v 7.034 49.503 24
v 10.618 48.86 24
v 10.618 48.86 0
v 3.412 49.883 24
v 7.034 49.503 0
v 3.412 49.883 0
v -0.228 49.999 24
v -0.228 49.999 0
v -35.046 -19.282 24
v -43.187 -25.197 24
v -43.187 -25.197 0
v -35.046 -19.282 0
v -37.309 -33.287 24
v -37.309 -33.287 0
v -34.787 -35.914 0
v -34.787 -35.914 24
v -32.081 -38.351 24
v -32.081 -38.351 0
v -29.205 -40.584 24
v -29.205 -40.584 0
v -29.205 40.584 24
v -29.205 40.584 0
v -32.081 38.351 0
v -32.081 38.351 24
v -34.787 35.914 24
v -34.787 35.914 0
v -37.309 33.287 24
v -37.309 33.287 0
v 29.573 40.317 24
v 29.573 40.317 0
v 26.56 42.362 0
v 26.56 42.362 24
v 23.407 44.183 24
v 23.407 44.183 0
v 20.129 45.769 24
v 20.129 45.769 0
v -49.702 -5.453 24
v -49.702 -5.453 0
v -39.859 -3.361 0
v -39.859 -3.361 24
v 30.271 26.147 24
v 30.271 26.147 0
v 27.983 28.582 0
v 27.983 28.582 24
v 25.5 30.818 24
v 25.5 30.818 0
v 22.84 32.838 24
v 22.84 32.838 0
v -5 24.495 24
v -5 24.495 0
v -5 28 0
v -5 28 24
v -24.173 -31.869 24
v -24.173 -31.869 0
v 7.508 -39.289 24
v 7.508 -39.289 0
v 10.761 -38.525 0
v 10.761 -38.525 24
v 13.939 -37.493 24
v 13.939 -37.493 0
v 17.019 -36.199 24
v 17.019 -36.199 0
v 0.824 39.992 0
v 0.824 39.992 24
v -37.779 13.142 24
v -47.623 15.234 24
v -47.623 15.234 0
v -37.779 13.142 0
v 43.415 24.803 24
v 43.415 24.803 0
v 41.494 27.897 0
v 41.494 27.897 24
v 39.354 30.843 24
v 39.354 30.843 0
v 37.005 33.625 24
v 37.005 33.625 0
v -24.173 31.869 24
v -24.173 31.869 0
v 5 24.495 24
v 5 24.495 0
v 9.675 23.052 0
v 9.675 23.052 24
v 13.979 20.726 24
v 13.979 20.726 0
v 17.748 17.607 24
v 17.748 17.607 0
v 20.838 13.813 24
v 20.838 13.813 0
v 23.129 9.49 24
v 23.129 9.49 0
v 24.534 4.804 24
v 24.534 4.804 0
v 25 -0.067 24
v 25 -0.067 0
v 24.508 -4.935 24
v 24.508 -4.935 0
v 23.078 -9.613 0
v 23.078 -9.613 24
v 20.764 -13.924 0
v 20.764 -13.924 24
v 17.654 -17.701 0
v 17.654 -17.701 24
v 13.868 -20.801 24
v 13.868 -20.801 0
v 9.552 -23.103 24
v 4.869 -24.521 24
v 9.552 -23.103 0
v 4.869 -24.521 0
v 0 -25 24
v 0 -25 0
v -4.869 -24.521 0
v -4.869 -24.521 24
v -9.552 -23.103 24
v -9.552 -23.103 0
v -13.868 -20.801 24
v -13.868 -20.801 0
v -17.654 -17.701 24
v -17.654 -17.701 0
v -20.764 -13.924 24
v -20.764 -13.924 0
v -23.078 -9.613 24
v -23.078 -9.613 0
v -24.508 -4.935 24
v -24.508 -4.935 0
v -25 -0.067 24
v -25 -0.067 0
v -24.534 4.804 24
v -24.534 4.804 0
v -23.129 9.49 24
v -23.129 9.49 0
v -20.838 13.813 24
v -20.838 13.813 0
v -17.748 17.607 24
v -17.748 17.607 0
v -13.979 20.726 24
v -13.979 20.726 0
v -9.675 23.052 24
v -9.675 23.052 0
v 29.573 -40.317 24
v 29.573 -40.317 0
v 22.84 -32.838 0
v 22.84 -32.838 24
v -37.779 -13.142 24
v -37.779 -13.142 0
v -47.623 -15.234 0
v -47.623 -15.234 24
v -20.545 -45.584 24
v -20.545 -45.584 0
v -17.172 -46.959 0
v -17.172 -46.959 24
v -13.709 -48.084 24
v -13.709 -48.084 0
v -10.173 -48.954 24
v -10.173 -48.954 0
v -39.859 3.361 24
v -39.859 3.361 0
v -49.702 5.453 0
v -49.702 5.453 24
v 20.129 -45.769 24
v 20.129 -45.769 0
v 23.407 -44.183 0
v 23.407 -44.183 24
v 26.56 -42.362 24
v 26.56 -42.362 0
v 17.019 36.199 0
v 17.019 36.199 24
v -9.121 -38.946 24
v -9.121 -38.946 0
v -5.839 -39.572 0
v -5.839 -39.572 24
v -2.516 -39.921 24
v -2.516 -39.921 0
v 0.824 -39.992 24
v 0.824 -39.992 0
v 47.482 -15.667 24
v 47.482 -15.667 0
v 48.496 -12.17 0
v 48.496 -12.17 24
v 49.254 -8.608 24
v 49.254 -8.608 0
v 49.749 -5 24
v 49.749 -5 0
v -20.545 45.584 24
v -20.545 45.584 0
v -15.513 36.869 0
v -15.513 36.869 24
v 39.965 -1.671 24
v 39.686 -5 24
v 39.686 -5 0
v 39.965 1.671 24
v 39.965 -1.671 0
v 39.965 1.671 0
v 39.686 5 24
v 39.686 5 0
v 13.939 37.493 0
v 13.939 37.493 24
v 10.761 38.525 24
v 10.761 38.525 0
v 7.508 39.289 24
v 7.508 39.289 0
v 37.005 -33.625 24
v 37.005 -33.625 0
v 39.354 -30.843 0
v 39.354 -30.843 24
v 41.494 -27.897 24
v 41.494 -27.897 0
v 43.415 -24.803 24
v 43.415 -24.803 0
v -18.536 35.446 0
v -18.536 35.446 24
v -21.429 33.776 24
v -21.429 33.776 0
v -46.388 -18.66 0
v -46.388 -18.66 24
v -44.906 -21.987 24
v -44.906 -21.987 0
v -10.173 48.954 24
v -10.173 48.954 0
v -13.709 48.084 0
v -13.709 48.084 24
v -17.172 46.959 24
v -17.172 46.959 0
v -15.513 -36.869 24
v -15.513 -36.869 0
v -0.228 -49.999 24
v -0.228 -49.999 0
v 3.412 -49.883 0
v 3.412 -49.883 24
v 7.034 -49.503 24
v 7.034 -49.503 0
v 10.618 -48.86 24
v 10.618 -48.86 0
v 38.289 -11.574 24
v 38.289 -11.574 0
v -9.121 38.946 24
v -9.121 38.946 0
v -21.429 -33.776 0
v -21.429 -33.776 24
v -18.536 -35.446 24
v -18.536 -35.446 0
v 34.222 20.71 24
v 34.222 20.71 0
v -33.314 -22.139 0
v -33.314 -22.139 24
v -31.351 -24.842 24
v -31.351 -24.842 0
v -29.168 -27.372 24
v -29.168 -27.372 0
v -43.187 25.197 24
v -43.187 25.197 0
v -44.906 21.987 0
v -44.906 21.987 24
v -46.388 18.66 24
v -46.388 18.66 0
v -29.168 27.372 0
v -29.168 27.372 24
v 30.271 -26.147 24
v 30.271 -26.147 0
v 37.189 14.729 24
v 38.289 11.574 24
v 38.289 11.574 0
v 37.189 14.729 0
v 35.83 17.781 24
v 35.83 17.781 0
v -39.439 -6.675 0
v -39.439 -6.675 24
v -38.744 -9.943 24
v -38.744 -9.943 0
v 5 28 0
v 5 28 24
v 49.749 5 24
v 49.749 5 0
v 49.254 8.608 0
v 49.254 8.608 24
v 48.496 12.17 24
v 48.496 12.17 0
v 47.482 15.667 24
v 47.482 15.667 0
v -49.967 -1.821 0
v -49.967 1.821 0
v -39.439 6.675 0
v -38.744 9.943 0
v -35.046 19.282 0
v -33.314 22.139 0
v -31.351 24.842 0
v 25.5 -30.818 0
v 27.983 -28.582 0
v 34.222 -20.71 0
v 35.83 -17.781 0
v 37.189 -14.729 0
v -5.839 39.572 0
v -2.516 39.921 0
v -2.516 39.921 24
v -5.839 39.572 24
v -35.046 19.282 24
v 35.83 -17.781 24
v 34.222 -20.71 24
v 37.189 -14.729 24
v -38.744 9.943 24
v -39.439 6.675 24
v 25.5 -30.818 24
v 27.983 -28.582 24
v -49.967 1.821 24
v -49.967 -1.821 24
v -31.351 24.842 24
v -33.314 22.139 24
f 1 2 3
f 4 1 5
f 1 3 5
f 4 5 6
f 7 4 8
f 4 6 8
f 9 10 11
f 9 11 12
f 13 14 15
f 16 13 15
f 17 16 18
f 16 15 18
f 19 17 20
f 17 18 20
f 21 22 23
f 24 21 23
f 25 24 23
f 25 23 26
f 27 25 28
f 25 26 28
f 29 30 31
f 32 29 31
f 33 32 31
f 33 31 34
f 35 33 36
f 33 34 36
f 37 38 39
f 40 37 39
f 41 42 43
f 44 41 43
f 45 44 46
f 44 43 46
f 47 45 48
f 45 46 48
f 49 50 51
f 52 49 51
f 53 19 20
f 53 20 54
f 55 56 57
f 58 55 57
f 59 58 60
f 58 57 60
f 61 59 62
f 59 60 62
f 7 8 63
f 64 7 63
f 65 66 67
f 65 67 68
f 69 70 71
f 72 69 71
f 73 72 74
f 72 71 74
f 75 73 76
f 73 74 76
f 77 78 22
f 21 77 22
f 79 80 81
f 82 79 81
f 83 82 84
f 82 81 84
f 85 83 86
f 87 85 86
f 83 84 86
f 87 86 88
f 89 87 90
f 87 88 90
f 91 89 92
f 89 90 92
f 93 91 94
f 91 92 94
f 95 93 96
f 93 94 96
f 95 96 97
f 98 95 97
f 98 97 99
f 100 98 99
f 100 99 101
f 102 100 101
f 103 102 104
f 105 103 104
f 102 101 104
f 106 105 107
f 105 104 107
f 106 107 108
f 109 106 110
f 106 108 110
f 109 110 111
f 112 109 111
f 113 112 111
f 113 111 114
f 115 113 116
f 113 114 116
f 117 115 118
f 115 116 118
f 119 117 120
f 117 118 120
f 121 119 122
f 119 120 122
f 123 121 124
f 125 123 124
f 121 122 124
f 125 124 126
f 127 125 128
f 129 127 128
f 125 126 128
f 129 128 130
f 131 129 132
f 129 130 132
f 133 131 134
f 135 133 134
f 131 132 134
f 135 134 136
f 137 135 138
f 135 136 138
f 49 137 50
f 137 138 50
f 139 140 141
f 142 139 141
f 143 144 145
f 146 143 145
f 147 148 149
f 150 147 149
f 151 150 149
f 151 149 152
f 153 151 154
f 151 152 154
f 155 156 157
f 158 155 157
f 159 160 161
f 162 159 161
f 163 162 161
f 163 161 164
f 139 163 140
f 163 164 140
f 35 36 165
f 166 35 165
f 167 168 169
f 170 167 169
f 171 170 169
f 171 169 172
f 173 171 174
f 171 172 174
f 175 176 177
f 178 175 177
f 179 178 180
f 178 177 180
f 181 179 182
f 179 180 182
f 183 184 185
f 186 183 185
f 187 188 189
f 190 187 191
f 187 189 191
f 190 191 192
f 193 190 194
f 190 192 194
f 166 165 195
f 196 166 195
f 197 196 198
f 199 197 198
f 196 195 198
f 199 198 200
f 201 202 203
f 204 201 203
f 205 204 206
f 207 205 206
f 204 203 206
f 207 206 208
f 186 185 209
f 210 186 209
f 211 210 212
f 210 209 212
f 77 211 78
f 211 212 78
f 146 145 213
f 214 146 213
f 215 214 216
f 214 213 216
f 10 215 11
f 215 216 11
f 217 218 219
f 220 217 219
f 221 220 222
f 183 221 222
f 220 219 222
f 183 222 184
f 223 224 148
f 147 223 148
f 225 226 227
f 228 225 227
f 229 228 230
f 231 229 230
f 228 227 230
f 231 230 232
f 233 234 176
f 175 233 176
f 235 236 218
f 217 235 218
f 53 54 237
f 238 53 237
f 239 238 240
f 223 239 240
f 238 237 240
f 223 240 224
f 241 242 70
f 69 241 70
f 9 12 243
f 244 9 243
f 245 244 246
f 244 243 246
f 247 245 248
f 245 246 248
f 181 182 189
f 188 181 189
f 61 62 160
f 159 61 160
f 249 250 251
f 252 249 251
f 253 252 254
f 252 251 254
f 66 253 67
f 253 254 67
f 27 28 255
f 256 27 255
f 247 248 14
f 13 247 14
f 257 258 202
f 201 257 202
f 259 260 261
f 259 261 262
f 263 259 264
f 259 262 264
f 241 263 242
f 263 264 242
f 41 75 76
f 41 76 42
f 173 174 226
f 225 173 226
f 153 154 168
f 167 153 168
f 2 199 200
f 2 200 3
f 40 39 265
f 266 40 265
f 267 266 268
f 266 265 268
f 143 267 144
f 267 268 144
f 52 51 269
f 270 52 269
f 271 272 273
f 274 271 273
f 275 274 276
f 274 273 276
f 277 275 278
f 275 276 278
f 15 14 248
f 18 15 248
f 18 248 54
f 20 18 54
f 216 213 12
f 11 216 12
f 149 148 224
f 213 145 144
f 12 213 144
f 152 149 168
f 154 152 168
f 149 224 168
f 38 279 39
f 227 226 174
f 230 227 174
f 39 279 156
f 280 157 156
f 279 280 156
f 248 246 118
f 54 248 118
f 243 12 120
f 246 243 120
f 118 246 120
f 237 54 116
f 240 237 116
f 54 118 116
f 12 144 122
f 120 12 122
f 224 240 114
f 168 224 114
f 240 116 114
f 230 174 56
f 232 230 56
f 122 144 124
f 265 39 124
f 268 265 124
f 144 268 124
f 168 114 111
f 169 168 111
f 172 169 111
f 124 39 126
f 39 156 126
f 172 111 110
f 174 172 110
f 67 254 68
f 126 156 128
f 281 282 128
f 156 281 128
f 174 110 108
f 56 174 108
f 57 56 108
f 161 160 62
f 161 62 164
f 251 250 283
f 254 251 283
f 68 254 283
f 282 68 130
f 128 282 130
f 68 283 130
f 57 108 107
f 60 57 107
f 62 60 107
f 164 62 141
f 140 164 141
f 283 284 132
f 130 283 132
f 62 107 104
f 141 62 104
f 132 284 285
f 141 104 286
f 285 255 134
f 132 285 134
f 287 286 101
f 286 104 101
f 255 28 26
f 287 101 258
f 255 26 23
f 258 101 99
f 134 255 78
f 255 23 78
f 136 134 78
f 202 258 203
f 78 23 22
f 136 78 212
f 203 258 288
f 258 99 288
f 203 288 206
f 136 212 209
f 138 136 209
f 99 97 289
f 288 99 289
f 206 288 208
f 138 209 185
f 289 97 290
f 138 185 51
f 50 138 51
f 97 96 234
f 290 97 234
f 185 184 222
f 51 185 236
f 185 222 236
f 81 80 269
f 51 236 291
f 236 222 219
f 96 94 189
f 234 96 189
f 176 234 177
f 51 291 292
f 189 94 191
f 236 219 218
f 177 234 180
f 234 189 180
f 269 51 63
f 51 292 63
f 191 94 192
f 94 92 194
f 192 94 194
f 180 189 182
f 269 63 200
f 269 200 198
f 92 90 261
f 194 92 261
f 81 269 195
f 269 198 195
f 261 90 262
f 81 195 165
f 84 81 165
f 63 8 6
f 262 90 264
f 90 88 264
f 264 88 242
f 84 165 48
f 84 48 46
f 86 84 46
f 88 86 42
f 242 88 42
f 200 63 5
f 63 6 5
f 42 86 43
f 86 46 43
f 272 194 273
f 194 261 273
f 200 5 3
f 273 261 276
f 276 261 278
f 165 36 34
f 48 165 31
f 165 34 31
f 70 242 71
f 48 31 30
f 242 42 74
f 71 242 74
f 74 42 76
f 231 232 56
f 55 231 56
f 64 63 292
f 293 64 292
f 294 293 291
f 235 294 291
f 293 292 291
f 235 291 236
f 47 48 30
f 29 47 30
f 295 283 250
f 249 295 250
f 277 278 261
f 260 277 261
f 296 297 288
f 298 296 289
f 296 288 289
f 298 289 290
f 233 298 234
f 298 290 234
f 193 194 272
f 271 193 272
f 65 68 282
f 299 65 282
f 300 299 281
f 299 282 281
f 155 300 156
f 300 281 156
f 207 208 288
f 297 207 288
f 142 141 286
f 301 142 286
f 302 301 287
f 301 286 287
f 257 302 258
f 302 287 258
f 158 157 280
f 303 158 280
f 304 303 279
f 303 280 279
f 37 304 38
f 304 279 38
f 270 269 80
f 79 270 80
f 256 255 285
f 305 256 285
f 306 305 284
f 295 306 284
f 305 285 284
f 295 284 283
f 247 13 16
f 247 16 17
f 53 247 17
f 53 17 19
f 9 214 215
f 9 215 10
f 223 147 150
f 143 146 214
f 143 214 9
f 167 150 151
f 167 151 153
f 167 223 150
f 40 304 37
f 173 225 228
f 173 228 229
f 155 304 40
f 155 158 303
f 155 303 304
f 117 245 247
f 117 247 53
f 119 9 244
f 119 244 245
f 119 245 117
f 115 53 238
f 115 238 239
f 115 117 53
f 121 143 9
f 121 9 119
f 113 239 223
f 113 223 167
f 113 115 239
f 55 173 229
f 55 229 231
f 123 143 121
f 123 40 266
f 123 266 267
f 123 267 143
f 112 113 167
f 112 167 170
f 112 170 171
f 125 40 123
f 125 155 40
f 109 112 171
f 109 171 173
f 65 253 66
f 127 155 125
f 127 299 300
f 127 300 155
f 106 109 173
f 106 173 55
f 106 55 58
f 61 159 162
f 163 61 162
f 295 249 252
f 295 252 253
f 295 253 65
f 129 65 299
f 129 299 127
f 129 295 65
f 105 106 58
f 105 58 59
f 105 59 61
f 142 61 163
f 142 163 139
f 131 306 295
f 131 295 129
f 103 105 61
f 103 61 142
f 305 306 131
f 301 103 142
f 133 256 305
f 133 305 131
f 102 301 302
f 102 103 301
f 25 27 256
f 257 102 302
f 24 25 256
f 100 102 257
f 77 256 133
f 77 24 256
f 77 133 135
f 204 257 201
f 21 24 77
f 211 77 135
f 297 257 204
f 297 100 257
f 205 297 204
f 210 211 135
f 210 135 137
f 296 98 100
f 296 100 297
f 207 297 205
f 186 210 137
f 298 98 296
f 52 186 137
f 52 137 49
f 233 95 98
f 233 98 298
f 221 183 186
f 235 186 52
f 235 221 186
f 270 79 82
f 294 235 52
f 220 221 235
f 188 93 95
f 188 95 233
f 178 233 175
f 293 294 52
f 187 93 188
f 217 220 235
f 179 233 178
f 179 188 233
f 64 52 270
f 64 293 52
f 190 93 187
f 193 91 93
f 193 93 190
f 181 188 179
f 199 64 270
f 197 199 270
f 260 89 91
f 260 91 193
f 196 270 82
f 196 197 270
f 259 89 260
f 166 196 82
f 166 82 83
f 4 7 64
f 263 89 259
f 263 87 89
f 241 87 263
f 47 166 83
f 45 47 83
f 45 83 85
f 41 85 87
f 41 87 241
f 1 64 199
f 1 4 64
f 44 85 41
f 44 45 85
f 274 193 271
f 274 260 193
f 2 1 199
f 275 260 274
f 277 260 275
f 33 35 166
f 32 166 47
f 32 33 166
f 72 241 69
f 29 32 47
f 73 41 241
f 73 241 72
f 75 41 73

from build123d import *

# Parameters (mm, degrees)
BOSS_EXTRUDE2_DEPTH = 24


with BuildPart() as part:
    # Sketch1 → Boss-Extrude2 (new body)
    with BuildSketch(Plane.XY):
        with BuildLine():
            Line((39.686269666, 5), (49.749371855, 5))
            ThreePointArc((49.749371855, 5), (48.907380037, 10.395584541), (47.481995894, 15.667165215))
            Line((47.481995894, 15.667165215), (38.2888946, 11.574132812))
            ThreePointArc((38.2888946, 11.574132812), (36.541818306, 16.269465723), (34.221528169, 20.709587388))
            Line((34.221528169, 20.709587388), (43.414629464, 24.802619792))
            ThreePointArc((43.414629464, 24.802619792), (40.450849719, 29.389262615), (37.004551483, 33.625335233))
            Line((37.004551483, 33.625335233), (30.271021813, 26.146992913))
            ThreePointArc((30.271021813, 26.146992913), (26.765224254, 29.725793019), (22.839573558, 32.838298977))
            Line((22.839573558, 32.838298977), (29.573103228, 40.316641297))
            ThreePointArc((29.573103228, 40.316641297), (25, 43.301270189), (20.128683944, 45.769379313))
            Line((20.128683944, 45.769379313), (17.019014352, 36.198800401))
            ThreePointArc((17.019014352, 36.198800401), (12.360679775, 38.042260652), (7.508449189, 39.288970345))
            Line((7.508449189, 39.288970345), (10.618118781, 48.859549256))
            ThreePointArc((10.618118781, 48.859549256), (5.226423163, 49.726094768), (-0.227615912, 49.999481907))
            Line((-0.227615912, 49.999481907), (0.824264696, 39.991506445))
            ThreePointArc((0.824264696, 39.991506445), (-4.181138531, 39.780875815), (-9.120954258, 38.946221812))
            Line((-9.120954258, 38.946221812), (-10.172834865, 48.954197275))
            ThreePointArc((-10.172834865, 48.954197275), (-15.450849719, 47.552825815), (-20.544558909, 45.584219849))
            Line((-20.544558909, 45.584219849), (-15.513007814, 36.869317712))
            ThreePointArc((-15.513007814, 36.869317712), (-20, 34.641016151), (-24.173261852, 31.869317712))
            Line((-24.173261852, 31.869317712), (-29.204812947, 40.584219849))
            ThreePointArc((-29.204812947, 40.584219849), (-33.456530318, 37.157241274), (-37.309161029, 33.287032059))
            Line((-37.309161029, 33.287032059), (-29.167940342, 27.372089))
            ThreePointArc((-29.167940342, 27.372089), (-32.360679775, 23.511410092), (-35.045792865, 19.281919056))
            Line((-35.045792865, 19.281919056), (-43.187013552, 25.196862116))
            ThreePointArc((-43.187013552, 25.196862116), (-45.677272882, 20.336832154), (-47.622670264, 15.234214023))
            Line((-47.622670264, 15.234214023), (-37.779471002, 13.141977432))
            ThreePointArc((-37.779471002, 13.141977432), (-39.125904029, 8.316467633), (-39.85858791, 3.360501425))
            Line((-39.85858791, 3.360501425), (-49.701787172, 5.452738016))
            ThreePointArc((-49.701787172, 5.452738016), (-50, 0), (-49.701787172, -5.452738016))
            Line((-49.701787172, -5.452738016), (-39.85858791, -3.360501425))
            ThreePointArc((-39.85858791, -3.360501425), (-39.125904029, -8.316467633), (-37.779471002, -13.141977432))
            Line((-37.779471002, -13.141977432), (-47.622670264, -15.234214023))
            ThreePointArc((-47.622670264, -15.234214023), (-45.677272882, -20.336832154), (-43.187013552, -25.196862116))
            Line((-43.187013552, -25.196862116), (-35.045792865, -19.281919056))
            ThreePointArc((-35.045792865, -19.281919056), (-32.360679775, -23.511410092), (-29.167940342, -27.372089))
            Line((-29.167940342, -27.372089), (-37.309161029, -33.287032059))
            ThreePointArc((-37.309161029, -33.287032059), (-33.456530318, -37.157241274), (-29.204812947, -40.584219849))
            Line((-29.204812947, -40.584219849), (-24.173261852, -31.869317712))
            ThreePointArc((-24.173261852, -31.869317712), (-20, -34.641016151), (-15.513007814, -36.869317712))
            Line((-15.513007814, -36.869317712), (-20.544558909, -45.584219849))
            ThreePointArc((-20.544558909, -45.584219849), (-15.450849719, -47.552825815), (-10.172834865, -48.954197275))
            Line((-10.172834865, -48.954197275), (-9.120954258, -38.946221812))
            ThreePointArc((-9.120954258, -38.946221812), (-4.181138531, -39.780875815), (0.824264696, -39.991506445))
            Line((0.824264696, -39.991506445), (-0.227615912, -49.999481907))
            ThreePointArc((-0.227615912, -49.999481907), (5.226423163, -49.726094768), (10.618118781, -48.859549256))
            Line((10.618118781, -48.859549256), (7.508449189, -39.288970345))
            ThreePointArc((7.508449189, -39.288970345), (12.360679775, -38.042260652), (17.019014352, -36.198800401))
            Line((17.019014352, -36.198800401), (20.128683944, -45.769379313))
            ThreePointArc((20.128683944, -45.769379313), (25, -43.301270189), (29.573103228, -40.316641297))
            Line((29.573103228, -40.316641297), (22.839573558, -32.838298977))
            ThreePointArc((22.839573558, -32.838298977), (26.765224254, -29.725793019), (30.271021813, -26.146992913))
            Line((30.271021813, -26.146992913), (37.004551483, -33.625335233))
            ThreePointArc((37.004551483, -33.625335233), (40.450849719, -29.389262615), (43.414629464, -24.802619792))
            Line((43.414629464, -24.802619792), (34.221528169, -20.709587388))
            ThreePointArc((34.221528169, -20.709587388), (36.541818306, -16.269465723), (38.2888946, -11.574132812))
            Line((38.2888946, -11.574132812), (47.481995894, -15.667165215))
            ThreePointArc((47.481995894, -15.667165215), (48.907380037, -10.395584541), (49.749371855, -5))
            Line((49.749371855, -5), (39.686269666, -5))
            ThreePointArc((39.686269666, -5), (40, 0), (39.686269666, 5))
        make_face()
        with BuildLine():
            Line((-5, 28), (5, 28))
            Line((5, 28), (5, 24.494897428))
            ThreePointArc((5, 24.494897428), (0, -25), (-5, 24.494897428))
            Line((-5, 24.494897428), (-5, 28))
        make_face(mode=Mode.SUBTRACT)
    extrude(amount=BOSS_EXTRUDE2_DEPTH)


solid = part.part
